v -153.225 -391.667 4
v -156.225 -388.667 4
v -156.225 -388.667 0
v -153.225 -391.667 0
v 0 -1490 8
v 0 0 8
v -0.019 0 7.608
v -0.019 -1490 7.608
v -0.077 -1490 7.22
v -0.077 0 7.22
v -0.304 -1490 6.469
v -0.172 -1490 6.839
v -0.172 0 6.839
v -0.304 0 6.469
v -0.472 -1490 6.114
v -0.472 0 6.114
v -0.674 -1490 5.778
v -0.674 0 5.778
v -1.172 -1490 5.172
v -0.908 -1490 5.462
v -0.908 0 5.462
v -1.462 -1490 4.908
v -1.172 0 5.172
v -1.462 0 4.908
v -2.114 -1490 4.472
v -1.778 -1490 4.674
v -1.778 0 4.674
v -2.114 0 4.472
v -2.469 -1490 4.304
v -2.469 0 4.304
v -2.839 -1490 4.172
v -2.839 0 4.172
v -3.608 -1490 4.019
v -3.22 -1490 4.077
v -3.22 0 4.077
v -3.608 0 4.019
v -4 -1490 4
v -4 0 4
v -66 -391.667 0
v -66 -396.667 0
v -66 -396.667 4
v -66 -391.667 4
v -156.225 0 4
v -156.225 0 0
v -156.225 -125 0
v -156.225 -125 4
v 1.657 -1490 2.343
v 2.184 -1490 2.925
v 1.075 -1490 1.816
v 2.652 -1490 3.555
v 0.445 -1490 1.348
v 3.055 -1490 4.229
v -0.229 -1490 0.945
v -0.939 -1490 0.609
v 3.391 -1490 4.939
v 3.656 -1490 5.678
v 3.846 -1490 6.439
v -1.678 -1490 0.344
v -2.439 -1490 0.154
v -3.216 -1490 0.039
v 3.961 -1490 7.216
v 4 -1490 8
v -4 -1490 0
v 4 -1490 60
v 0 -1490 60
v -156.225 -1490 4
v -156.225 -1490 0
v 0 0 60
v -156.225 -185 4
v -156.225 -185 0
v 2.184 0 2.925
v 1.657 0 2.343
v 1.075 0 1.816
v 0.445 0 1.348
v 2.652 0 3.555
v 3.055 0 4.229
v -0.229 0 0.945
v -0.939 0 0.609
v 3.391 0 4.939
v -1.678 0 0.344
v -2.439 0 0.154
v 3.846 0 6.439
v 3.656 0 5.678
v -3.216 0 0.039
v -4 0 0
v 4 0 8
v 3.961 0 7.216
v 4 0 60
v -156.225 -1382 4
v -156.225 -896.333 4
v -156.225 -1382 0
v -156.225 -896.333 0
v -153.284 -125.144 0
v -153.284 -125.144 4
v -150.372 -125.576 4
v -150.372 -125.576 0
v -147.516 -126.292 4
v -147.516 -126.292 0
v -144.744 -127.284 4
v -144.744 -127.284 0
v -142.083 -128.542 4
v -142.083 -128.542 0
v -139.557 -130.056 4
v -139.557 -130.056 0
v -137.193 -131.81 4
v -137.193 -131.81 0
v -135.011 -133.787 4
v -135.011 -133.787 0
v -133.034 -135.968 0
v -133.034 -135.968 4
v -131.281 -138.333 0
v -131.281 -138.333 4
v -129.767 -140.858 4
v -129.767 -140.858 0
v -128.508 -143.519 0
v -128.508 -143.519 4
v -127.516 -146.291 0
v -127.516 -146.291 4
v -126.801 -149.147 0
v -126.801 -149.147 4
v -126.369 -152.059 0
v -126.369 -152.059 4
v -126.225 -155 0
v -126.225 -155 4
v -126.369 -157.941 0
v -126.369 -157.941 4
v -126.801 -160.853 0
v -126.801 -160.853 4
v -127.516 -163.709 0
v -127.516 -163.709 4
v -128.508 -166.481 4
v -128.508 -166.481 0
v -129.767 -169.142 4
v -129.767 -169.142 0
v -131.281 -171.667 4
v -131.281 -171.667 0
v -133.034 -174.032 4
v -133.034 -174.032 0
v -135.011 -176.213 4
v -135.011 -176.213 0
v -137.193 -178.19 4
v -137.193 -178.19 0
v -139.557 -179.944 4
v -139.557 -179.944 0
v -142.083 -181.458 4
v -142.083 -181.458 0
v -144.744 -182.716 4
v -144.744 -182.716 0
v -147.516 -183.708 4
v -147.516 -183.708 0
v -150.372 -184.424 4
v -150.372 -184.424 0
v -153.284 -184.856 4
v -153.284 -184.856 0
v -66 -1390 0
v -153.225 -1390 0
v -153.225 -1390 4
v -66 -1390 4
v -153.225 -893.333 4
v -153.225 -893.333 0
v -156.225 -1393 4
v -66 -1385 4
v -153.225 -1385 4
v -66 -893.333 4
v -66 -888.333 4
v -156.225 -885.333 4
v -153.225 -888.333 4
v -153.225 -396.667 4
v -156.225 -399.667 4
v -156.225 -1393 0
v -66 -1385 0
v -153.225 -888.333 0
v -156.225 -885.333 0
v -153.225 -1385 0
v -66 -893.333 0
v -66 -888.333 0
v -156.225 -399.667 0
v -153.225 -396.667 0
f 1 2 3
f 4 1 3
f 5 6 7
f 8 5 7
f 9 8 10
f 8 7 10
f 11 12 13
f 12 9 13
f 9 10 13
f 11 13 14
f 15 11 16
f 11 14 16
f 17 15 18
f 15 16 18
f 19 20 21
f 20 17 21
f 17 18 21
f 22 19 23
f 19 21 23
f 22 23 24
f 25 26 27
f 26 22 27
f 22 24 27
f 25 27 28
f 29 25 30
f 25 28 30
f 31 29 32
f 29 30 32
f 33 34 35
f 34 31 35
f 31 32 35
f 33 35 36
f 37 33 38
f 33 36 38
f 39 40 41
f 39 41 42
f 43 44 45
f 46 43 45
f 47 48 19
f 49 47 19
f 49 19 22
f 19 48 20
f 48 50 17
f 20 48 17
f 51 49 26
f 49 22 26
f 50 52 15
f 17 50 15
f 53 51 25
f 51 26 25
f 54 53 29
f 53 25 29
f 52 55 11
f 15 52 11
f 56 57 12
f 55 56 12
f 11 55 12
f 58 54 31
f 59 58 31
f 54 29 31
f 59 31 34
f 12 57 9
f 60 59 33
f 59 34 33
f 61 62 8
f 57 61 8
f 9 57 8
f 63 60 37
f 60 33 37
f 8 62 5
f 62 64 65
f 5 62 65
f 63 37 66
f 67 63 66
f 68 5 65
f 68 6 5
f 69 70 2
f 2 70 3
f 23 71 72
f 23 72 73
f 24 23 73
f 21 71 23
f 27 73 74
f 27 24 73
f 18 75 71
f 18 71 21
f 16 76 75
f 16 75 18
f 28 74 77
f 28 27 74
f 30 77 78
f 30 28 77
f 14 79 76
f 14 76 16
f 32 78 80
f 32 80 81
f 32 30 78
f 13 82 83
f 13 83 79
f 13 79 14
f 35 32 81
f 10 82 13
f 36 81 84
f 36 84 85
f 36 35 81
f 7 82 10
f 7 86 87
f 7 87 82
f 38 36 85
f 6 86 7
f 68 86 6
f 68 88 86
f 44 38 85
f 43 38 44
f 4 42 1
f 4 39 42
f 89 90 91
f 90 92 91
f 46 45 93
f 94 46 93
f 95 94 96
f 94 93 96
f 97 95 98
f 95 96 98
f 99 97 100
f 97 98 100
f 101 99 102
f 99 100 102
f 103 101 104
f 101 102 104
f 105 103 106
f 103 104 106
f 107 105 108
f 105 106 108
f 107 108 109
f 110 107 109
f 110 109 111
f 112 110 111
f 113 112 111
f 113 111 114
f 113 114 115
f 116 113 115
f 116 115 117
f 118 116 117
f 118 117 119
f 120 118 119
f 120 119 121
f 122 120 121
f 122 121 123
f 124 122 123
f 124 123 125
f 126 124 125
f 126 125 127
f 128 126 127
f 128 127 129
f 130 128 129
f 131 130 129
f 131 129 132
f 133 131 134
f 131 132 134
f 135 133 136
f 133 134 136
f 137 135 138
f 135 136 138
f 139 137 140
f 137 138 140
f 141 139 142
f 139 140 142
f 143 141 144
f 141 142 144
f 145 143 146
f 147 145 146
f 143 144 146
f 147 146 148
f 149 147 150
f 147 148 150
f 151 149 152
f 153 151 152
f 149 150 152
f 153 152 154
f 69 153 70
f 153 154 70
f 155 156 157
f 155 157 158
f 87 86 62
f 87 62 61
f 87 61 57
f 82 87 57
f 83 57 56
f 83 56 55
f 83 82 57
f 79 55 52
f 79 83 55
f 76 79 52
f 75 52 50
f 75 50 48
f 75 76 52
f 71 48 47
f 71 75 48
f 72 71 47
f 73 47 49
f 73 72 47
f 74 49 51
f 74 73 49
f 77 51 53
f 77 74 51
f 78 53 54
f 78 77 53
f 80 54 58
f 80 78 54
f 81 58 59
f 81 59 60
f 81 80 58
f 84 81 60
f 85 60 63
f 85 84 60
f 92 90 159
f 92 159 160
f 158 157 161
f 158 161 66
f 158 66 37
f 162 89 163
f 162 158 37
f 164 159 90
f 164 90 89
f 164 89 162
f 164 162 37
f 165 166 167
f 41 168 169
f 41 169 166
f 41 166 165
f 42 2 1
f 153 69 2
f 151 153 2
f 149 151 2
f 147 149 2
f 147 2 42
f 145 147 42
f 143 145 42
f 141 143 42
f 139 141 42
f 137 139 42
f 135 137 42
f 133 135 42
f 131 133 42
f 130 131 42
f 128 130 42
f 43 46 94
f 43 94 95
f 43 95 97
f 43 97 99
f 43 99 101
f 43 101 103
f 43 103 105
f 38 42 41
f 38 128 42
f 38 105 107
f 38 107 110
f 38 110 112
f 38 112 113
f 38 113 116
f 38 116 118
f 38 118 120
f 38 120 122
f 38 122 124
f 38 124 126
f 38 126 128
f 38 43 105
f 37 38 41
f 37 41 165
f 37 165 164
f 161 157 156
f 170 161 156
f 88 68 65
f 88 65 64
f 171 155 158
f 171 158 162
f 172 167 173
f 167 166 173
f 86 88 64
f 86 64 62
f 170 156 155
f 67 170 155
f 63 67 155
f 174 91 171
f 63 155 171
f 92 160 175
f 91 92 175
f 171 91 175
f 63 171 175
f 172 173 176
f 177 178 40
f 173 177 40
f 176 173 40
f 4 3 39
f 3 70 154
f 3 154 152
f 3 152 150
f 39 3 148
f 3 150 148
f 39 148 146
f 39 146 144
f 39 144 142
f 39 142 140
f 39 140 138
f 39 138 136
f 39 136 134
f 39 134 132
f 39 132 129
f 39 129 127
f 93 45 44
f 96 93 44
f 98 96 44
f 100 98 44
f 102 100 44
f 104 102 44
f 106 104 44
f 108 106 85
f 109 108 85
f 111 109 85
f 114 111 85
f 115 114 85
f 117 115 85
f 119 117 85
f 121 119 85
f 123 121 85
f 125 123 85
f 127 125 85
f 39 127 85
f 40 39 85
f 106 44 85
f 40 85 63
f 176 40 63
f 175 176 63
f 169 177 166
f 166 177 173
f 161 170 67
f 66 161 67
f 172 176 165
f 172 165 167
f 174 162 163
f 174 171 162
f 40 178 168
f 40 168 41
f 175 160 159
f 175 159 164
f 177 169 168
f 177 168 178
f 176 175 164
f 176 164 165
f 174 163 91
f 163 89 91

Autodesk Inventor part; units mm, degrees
ref_plane "YZ Plane" through (0, 0, 0) normal (1, 0, 0) x (0, 1, 0)
ref_plane "XZ Plane" through (0, 0, 0) normal (0, 1, 0) x (-1, 0, 0)
ref_plane "XY Plane" through (0, 0, 0) normal (0, 0, 1) x (1, 0, 0)
sketch "Sketch1" plane through (0, 0, 0) normal (0, 0, 1) x (1, 0, 0)
  line L0 (0, 0) -> (-156.2246, 0)
  line L1 (-156.2246, 0) -> (-156.2246, -1490)
  line L2 (-156.2246, -1490) -> (0, -1490)
  line L3 (0, -1490) -> (0, 0)
  line L4 (-156.2246, -1390) -> (-66, -1390)
  line L5 (-66, -1390) -> (-66, -1385)
  line L6 (-66, -1385) -> (-156.2246, -1385)
  line L7 (-156.2246, -1385) -> (-156.2246, -1390)
  line L8 (-156.2246, -893.3333) -> (-66, -893.3333)
  line L9 (-66, -893.3333) -> (-66, -888.3333)
  line L10 (-66, -888.3333) -> (-156.2246, -888.3333)
  line L11 (-156.2246, -888.3333) -> (-156.2246, -893.3333)
  line L12 (-156.2246, -396.6667) -> (-66, -396.6667)
  line L13 (-66, -396.6667) -> (-66, -391.6667)
  line L14 (-66, -391.6667) -> (-156.2246, -391.6667)
  line L15 (-156.2246, -391.6667) -> (-156.2246, -396.6667)
  circle A0 centre (-156.2246, -155) radius 30
  point P0 (-156.2246, -391.6667)
  point P1 (-156.2246, -125)
  point P2 (-156.2246, -185)
  dimension "d0" = 1490
  dimension "d1" = 156.2246
  dimension "d2" = 5
  dimension "d4" = 100
  dimension "d7" = 496.6667
  dimension "d23" = 66
  dimension "d28" = 60
  dimension "d29" = 1335
extrude "Plate1" add sketch "Sketch1" along normal blind 4 contours L3 L2 L1 L4 L5 L6 L8 L9 L10 L12 L13 L14 A0 L0
sketch "Sketch2" plane through (4, 0, 0) normal (-1, 0, 0) x (0, -1, 0)
  line L0 (1490, 0) -> (0, 0)
  line L1 (0, 0) -> (0, 60)
  line L2 (0, 60) -> (1490, 60)
  line L3 (1490, 60) -> (1490, 0)
edge flange "Flange1" height 60 angle 90 thickness 4 bend radius 4 thickness toward (-1, 0, 0) relief tear relief width 4 relief depth 2 edges at (0, -745, 4) wall of the first edge with corners at (4, -1490, 0) (4, 0, 0) (4, 0, 60) (4, -1490, 60)
bend "Bend1"
corner "Corner1"
chamfer "Corner Chamfer1" distance 3 angle 45 6 edges at (-156.2246, -1390, 2) (-156.2246, -1385, 2) (-156.2246, -893.3333, 2) (-156.2246, -888.3333, 2) (-156.2246, -391.6667, 2) (-156.2246, -396.6667, 2)
equation "\"d0\" = Стрингер_длина"
equation "\"d1\" = стрингер_глубина_4"
equation "\"d2\" = паз_под_стрингер_толщина"
equation "\"d7\" = Шаг_шпангоутов"
equation "\"d23\" = паз_под_стрингер_глубина - Thickness"
equation "\"d28\" = 2 * радиус_выреза_под_сварку"
equation "\"d12\" = Thickness"
equation "\"d13\" = BendReliefWidth"
equation "\"d14\" = BendReliefDepth"
equation "\"d15\" = MinimumRemnant"
equation "\"d16\" = TransitionRadius"
equation "\"d17\" = ребро_усилителей"
equation "\"d19\" = BendRadius"
equation "\"d20\" = CornerReliefSize"
equation "\"d21\" = GapSize"
equation "\"d22\" = JacobiRadiusSize"
equation "\"BendRadius\" = Thickness"
equation "\"BendReliefWidth\" = Thickness"
equation "\"BendReliefDepth\" = 0.5 * Thickness"
equation "\"CornerReliefSize\" = 4 * Thickness"
equation "\"MinimumRemnant\" = 2 * Thickness"
equation "\"TransitionRadius\" = BendRadius"
equation "\"JacobiRadiusSize\" = BendRadius"
equation "\"GapSize\" = Thickness"
equation "\"Стрингер_длина\" = 1490"
equation "\"стрингер_глубина_4\" = 156.224572"
equation "\"паз_под_стрингер_толщина\" = 5"
equation "\"Шаг_шпангоутов\" = 496.666667"
equation "\"паз_под_стрингер_глубина\" = 70"
equation "\"Thickness\" = 4"
equation "\"радиус_выреза_под_сварку\" = 30"
equation "\"ребро_усилителей\" = 60"
properties part number "GBK 1212 stringer 4" material "Steel"
